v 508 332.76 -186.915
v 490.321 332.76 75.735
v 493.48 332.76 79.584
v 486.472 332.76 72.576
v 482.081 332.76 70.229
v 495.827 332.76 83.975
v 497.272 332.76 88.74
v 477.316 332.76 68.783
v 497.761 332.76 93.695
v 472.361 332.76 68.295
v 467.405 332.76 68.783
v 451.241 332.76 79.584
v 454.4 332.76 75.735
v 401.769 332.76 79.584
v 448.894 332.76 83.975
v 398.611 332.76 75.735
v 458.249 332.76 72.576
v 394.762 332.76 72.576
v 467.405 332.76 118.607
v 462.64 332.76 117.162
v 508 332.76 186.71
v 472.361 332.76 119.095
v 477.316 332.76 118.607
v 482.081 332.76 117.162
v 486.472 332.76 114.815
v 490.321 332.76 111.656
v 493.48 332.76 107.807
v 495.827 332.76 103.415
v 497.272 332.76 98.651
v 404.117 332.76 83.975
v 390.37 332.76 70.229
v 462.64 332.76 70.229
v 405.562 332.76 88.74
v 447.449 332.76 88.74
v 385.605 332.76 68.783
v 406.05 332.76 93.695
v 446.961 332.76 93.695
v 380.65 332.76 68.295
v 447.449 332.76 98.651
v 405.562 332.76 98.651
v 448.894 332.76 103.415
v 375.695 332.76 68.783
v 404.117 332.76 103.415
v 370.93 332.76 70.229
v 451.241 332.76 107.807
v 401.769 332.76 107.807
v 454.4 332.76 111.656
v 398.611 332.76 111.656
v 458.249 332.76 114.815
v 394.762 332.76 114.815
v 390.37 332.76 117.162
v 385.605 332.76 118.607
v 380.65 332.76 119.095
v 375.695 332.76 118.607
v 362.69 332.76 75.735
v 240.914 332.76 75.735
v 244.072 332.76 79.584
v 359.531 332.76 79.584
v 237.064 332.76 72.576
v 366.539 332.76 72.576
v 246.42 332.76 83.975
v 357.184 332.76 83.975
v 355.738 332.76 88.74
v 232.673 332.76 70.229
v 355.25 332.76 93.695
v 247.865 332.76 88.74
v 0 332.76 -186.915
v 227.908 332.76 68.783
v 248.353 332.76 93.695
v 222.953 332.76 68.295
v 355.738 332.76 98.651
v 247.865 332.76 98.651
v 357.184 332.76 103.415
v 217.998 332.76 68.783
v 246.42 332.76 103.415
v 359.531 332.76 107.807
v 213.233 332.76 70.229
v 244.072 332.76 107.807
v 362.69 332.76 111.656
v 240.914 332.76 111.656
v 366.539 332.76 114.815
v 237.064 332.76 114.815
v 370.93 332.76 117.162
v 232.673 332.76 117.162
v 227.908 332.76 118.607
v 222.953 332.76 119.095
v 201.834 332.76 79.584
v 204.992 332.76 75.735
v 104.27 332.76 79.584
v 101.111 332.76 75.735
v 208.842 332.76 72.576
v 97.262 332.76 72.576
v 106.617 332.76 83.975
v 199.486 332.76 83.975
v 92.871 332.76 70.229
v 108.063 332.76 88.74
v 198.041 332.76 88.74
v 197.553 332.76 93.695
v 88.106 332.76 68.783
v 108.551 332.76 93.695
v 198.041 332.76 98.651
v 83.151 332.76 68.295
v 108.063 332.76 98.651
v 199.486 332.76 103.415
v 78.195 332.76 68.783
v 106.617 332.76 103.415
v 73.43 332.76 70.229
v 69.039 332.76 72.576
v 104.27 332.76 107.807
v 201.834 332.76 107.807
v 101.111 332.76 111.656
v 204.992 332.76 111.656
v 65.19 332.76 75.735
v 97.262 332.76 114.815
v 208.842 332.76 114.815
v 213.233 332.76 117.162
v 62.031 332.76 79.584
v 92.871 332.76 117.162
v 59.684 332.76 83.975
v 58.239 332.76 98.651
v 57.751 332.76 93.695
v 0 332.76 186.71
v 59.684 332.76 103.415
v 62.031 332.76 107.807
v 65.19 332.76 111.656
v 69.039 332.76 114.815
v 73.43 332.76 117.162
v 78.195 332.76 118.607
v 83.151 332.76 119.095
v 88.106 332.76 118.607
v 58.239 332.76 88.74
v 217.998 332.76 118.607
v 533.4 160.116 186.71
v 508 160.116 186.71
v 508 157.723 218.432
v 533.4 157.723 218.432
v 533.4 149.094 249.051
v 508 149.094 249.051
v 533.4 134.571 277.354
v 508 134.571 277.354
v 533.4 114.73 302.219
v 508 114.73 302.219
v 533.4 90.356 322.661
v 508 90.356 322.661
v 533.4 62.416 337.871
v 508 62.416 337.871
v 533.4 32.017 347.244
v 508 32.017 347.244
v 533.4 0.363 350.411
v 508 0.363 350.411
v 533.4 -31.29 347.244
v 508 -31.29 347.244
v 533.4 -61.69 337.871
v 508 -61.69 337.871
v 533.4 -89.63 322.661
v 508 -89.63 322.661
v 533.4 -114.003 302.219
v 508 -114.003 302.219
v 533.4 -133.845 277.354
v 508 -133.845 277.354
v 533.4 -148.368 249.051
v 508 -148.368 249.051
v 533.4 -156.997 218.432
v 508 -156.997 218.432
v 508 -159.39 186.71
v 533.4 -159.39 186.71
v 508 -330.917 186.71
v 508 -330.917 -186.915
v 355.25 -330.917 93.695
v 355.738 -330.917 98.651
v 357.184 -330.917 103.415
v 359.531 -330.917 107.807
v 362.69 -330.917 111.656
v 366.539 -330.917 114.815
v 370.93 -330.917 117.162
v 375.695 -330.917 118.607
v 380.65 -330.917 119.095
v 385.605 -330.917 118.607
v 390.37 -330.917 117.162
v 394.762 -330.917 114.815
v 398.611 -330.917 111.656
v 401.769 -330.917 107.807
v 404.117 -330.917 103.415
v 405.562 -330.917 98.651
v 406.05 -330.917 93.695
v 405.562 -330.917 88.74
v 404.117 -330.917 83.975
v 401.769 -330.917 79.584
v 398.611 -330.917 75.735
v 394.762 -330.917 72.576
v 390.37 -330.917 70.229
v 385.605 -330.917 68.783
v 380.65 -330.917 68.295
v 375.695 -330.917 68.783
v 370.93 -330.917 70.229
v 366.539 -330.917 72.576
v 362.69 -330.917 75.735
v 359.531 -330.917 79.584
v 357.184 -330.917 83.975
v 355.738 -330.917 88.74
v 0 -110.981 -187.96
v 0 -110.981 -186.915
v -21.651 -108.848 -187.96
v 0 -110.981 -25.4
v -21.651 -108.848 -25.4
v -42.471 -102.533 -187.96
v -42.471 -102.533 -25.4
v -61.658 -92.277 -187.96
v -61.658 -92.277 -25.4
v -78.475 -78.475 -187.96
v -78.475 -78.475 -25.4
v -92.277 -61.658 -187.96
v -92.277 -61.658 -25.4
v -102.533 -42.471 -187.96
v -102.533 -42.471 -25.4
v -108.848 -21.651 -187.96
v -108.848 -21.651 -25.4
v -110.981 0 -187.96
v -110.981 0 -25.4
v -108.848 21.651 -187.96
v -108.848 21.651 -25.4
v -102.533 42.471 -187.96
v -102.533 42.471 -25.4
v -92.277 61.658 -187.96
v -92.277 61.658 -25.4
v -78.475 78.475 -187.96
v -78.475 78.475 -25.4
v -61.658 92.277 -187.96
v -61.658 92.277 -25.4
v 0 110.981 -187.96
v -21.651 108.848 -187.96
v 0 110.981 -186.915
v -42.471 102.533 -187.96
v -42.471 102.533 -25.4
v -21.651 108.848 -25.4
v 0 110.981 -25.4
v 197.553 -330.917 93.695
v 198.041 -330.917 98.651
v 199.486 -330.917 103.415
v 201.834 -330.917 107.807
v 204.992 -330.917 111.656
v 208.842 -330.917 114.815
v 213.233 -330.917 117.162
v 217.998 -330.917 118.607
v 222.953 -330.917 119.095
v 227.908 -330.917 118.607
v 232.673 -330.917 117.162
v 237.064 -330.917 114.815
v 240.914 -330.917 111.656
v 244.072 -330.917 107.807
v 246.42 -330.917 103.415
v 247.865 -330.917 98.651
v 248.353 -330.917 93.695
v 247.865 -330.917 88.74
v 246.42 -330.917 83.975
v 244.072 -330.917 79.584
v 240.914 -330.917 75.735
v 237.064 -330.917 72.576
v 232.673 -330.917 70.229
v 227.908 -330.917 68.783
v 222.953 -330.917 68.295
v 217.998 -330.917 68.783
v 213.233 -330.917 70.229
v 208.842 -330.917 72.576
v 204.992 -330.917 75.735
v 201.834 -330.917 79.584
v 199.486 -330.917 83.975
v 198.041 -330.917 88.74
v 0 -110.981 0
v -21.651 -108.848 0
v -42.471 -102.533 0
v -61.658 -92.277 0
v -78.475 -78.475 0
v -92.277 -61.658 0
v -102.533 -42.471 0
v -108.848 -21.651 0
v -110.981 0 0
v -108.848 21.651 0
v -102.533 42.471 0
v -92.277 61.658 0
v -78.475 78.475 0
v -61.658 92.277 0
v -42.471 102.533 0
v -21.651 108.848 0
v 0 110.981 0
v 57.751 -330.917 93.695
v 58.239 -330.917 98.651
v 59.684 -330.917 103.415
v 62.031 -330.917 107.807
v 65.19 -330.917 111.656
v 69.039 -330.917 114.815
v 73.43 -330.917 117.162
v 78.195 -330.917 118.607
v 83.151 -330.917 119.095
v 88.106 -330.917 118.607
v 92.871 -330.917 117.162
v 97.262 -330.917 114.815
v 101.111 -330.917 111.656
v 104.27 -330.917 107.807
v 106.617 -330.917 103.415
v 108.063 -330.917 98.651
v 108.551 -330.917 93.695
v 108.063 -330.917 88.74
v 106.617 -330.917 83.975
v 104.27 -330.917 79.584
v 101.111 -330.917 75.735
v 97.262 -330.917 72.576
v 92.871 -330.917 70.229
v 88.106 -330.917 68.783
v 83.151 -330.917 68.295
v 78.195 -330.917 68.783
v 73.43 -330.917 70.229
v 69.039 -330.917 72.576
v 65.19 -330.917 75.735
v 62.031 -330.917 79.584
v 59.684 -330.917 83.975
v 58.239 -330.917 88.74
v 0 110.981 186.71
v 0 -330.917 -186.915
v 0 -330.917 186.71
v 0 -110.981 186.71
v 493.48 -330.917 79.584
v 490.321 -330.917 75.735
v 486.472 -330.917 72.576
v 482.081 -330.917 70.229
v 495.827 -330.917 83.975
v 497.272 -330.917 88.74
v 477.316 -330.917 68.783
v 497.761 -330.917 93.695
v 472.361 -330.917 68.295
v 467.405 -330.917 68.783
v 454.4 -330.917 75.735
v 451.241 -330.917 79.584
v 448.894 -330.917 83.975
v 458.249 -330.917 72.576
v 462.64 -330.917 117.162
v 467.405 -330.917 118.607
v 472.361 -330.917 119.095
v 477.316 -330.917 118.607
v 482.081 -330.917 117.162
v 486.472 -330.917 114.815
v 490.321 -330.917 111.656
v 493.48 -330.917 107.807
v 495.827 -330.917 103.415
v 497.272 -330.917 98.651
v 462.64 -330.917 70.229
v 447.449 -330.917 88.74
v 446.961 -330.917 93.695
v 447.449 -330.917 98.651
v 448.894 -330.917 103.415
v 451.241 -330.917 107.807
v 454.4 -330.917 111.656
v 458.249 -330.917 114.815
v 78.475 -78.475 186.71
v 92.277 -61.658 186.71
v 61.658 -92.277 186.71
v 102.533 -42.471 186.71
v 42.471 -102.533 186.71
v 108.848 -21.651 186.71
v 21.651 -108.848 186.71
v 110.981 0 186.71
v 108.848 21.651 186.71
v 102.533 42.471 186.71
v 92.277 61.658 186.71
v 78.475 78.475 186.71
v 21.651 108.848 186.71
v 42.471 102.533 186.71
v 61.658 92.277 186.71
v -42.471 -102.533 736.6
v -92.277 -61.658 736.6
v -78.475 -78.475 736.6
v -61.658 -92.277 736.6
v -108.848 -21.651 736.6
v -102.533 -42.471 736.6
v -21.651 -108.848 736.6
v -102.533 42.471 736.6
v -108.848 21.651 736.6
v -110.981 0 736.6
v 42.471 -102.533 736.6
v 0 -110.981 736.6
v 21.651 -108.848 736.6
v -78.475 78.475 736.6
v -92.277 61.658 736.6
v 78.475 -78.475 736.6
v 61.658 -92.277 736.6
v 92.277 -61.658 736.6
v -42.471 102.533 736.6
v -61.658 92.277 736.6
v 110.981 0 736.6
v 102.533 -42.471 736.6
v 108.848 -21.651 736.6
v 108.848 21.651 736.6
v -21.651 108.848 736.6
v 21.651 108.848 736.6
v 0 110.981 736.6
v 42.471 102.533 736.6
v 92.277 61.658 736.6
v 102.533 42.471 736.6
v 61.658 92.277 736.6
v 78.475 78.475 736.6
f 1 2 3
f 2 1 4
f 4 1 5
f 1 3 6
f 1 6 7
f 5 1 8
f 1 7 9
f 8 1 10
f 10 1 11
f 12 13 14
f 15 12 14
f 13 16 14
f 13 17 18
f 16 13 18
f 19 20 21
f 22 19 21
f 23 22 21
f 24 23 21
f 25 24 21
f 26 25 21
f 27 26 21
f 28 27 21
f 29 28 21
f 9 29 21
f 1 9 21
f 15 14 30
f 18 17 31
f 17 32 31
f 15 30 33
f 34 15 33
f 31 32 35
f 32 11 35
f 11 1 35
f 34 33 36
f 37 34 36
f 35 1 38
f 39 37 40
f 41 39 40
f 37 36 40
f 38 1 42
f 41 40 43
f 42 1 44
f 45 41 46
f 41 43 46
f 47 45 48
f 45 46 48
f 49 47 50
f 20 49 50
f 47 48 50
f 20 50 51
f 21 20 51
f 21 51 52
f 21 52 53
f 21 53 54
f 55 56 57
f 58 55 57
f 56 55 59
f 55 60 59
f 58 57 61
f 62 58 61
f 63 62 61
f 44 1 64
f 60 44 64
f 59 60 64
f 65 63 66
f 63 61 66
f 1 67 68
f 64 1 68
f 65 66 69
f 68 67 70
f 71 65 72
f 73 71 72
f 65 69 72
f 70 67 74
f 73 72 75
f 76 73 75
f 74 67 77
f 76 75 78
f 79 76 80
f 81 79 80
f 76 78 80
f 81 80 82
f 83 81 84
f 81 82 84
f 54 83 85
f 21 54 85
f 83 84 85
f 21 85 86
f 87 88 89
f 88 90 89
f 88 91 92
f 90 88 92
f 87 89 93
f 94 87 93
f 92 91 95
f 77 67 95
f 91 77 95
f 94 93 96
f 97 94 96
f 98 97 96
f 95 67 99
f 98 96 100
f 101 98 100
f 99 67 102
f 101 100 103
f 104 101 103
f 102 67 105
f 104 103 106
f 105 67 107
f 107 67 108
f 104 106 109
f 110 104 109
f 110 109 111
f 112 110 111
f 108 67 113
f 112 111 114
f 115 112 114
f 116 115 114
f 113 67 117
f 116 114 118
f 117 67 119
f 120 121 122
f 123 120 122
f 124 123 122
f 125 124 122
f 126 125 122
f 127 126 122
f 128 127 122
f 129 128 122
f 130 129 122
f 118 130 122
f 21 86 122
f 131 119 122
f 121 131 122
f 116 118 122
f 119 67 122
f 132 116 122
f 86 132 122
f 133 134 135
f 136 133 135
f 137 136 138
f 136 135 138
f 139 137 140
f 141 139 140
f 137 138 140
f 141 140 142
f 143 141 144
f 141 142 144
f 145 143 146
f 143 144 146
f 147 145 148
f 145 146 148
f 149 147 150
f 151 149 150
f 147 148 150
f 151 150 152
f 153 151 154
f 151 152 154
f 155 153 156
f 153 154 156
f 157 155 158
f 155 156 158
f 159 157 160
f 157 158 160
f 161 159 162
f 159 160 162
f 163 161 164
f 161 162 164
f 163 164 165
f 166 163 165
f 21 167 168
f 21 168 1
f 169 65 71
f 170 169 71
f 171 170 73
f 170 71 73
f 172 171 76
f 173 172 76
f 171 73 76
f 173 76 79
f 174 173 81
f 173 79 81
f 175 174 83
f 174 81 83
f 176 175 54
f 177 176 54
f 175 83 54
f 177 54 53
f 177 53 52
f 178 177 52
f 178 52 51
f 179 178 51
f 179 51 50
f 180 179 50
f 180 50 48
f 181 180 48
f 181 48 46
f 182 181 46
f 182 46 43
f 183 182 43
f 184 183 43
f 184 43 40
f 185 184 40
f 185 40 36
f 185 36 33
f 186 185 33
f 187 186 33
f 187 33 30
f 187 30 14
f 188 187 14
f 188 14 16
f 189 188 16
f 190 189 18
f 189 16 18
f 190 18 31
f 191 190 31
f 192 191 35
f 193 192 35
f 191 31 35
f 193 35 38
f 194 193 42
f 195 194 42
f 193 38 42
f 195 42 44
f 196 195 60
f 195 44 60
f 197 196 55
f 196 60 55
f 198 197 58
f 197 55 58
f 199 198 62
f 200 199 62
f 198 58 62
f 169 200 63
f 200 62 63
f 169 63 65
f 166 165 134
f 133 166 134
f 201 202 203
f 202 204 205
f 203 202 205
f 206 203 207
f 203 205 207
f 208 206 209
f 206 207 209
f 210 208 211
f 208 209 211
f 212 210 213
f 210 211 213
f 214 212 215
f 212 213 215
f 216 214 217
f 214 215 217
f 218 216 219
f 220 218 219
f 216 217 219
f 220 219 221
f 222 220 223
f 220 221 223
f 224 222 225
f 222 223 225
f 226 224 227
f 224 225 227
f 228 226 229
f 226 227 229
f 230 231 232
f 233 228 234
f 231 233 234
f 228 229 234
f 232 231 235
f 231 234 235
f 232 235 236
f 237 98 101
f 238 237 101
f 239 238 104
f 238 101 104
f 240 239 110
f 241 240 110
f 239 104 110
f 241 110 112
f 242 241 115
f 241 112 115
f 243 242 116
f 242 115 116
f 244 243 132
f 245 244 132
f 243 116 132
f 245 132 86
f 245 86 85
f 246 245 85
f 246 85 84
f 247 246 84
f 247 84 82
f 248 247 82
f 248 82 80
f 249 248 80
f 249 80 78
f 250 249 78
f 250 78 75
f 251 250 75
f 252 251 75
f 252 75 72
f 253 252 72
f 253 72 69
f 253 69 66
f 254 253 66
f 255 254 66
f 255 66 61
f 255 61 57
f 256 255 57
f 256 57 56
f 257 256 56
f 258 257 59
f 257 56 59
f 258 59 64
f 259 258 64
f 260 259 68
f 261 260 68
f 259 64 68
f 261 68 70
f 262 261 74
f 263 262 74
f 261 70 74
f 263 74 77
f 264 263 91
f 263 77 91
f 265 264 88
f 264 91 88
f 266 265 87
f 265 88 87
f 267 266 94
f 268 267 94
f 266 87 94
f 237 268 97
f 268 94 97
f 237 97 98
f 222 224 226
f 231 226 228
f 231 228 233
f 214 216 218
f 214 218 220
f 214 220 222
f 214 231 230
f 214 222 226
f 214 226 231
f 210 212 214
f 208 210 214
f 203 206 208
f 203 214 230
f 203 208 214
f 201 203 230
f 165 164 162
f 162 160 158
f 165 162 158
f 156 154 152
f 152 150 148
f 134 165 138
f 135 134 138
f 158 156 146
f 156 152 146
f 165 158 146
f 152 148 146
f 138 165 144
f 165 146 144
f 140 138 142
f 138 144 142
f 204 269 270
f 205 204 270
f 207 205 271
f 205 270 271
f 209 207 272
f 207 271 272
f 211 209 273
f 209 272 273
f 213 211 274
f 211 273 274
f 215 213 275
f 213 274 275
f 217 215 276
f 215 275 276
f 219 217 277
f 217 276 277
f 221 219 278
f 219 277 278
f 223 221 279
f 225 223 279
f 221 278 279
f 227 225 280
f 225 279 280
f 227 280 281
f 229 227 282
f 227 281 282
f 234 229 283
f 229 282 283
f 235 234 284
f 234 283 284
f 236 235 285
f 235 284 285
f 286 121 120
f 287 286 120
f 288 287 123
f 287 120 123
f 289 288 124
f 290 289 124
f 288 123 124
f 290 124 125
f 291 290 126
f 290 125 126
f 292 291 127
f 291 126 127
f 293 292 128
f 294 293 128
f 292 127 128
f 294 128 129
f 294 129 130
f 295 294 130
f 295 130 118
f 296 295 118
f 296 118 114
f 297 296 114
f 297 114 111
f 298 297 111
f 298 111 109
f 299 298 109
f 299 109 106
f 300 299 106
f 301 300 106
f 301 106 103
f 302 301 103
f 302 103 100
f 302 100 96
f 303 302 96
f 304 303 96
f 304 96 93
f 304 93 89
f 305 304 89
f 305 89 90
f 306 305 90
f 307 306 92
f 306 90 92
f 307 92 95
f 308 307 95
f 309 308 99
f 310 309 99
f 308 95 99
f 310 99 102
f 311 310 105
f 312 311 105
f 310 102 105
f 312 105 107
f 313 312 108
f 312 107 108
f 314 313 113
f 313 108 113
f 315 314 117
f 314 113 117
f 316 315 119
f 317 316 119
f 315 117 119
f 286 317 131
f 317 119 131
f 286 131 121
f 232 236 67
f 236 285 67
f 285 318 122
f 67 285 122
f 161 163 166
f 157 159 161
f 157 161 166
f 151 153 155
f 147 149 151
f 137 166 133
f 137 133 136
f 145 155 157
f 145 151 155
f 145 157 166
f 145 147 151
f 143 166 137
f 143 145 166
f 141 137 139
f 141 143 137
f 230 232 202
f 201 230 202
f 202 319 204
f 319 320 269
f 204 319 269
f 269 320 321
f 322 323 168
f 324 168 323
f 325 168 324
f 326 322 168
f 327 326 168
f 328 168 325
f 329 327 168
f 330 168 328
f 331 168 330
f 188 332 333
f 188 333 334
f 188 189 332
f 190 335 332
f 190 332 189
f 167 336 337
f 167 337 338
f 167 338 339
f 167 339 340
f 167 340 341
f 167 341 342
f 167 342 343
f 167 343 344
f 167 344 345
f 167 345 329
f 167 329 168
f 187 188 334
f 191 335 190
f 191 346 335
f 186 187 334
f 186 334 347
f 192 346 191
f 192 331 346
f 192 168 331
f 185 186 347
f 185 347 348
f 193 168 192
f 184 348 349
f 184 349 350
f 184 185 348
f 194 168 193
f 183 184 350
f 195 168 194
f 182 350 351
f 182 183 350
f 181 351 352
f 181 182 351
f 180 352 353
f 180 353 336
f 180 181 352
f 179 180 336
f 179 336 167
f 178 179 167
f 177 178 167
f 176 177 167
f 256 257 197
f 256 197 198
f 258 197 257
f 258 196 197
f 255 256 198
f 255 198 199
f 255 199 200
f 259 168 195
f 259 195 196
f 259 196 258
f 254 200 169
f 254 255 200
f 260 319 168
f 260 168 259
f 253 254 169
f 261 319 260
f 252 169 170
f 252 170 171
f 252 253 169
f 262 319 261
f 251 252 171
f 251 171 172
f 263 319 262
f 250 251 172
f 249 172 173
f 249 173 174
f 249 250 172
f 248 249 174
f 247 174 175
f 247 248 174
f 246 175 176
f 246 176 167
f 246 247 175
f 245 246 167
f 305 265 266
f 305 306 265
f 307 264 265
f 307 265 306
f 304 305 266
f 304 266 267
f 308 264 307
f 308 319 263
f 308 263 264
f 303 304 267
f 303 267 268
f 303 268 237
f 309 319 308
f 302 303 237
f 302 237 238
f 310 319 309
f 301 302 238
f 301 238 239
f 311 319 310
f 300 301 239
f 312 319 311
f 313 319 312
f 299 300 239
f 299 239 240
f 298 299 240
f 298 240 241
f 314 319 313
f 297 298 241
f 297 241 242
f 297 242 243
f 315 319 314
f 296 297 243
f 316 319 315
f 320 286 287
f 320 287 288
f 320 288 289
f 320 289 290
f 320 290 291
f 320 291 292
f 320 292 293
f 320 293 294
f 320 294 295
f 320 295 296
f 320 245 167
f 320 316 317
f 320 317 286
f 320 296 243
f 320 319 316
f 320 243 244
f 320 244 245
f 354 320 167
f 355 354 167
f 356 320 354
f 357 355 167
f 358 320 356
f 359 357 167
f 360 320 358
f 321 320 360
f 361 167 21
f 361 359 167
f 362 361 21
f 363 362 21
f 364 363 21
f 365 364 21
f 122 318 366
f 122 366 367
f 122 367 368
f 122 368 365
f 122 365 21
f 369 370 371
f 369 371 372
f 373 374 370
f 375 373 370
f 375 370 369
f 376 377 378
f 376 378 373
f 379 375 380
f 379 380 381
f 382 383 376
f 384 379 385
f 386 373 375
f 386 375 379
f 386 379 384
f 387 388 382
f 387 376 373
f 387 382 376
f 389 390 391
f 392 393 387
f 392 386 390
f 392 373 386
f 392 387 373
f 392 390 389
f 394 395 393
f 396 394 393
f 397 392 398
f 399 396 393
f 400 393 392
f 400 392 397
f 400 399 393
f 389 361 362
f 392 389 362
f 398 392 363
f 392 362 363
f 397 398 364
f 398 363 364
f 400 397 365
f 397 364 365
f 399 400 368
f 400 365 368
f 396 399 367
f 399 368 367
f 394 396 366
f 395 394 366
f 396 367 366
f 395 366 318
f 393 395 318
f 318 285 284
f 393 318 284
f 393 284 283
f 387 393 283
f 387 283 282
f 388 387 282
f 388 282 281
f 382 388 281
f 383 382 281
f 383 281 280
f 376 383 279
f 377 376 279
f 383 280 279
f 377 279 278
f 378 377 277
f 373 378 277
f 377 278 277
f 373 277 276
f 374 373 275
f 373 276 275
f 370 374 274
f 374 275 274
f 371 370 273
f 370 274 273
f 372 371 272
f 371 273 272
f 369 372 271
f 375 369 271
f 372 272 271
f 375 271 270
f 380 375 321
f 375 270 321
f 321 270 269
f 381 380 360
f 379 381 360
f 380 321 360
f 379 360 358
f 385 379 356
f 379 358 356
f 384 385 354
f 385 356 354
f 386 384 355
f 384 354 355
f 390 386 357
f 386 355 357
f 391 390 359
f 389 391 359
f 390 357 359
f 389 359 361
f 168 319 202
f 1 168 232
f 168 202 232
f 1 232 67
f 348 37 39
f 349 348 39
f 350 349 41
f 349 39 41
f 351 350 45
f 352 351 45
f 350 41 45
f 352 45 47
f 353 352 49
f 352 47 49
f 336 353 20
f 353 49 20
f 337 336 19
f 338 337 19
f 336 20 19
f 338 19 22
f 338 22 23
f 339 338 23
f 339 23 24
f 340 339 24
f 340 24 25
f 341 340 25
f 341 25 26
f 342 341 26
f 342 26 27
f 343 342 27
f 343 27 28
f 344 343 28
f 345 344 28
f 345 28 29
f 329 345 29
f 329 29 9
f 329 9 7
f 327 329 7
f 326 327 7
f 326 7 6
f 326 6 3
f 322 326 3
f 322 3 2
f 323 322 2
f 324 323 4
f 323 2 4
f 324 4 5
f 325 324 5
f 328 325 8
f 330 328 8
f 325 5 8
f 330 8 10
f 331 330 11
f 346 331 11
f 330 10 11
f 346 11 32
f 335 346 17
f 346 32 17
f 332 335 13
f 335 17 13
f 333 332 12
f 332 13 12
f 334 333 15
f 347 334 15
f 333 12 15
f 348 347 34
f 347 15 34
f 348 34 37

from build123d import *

# Parameters (mm, degrees)
F0_R     = 110.9807708896
F1_DEPTH = 736.6
F2_W     = 663.6773943901
F2_H     = 373.6258000135
F3_DEPTH = 508
F5_DEPTH = 25.4
F7_DEPTH = 25.4
F9_DEPTH = 162.56
F11_D    = 50.8


with BuildPart() as f1:
    # F0 (on Top) → F1 (new body)
    with BuildSketch(Plane.XY):
        Circle(F0_R)
    extrude(amount=F1_DEPTH)

    # F2 (on Right) → F3 (join)
    with BuildSketch(Plane.YZ):
        with Locations((0.9217560291, -0.1024082303)):
            Rectangle(F2_W, F2_H)
    extrude(amount=F3_DEPTH)

    # F6 (on face) → F7 (join)
    with BuildSketch(Plane(origin=(0, 0, 0), x_dir=(1, 0, 0), z_dir=(0, 0, -1))):
        with BuildLine():
            Line((0, -110.9807708896), (0, 110.9807708896))
            ThreePointArc((0, 110.9807708896), (-110.9807708896, 0), (0, -110.9807708896))
        make_face()
    extrude(amount=F7_DEPTH)

    # F8 (on face) → F9 (join)
    with BuildSketch(Plane(origin=(0, 0, -25.4), x_dir=(1, 0, 0), z_dir=(0, 0, -1))):
        with BuildLine():
            Line((0, -110.9807708896), (0, 110.9807708896))
            ThreePointArc((0, 110.9807708896), (-110.9807708896, 0), (0, -110.9807708896))
        make_face()
    extrude(amount=F9_DEPTH)

    # F11 (through all)
    with Locations(Plane.XZ.offset(330.9169411659)):
        with Locations((83.1505954266, 93.6952754855), (222.9530066252, 93.6952754855), (380.6501328945, 93.6952754855), (472.3605215549, 93.6952754855)):
            Hole(F11_D / 2)


with BuildPart() as f5:
    # F4 (on face) → F5 (new body)
    with BuildSketch(Plane.YZ.offset(508)):
        with BuildLine():
            Line((-159.3900769949, 186.7104917765), (160.1164340973, 186.7104917765))
            ThreePointArc((160.1164340973, 186.7104917765), (0.3631785512, 350.410705947), (-159.3900769949, 186.7104917765))
        make_face()
    extrude(amount=F5_DEPTH)


solid = Compound([f1.part, f5.part])
